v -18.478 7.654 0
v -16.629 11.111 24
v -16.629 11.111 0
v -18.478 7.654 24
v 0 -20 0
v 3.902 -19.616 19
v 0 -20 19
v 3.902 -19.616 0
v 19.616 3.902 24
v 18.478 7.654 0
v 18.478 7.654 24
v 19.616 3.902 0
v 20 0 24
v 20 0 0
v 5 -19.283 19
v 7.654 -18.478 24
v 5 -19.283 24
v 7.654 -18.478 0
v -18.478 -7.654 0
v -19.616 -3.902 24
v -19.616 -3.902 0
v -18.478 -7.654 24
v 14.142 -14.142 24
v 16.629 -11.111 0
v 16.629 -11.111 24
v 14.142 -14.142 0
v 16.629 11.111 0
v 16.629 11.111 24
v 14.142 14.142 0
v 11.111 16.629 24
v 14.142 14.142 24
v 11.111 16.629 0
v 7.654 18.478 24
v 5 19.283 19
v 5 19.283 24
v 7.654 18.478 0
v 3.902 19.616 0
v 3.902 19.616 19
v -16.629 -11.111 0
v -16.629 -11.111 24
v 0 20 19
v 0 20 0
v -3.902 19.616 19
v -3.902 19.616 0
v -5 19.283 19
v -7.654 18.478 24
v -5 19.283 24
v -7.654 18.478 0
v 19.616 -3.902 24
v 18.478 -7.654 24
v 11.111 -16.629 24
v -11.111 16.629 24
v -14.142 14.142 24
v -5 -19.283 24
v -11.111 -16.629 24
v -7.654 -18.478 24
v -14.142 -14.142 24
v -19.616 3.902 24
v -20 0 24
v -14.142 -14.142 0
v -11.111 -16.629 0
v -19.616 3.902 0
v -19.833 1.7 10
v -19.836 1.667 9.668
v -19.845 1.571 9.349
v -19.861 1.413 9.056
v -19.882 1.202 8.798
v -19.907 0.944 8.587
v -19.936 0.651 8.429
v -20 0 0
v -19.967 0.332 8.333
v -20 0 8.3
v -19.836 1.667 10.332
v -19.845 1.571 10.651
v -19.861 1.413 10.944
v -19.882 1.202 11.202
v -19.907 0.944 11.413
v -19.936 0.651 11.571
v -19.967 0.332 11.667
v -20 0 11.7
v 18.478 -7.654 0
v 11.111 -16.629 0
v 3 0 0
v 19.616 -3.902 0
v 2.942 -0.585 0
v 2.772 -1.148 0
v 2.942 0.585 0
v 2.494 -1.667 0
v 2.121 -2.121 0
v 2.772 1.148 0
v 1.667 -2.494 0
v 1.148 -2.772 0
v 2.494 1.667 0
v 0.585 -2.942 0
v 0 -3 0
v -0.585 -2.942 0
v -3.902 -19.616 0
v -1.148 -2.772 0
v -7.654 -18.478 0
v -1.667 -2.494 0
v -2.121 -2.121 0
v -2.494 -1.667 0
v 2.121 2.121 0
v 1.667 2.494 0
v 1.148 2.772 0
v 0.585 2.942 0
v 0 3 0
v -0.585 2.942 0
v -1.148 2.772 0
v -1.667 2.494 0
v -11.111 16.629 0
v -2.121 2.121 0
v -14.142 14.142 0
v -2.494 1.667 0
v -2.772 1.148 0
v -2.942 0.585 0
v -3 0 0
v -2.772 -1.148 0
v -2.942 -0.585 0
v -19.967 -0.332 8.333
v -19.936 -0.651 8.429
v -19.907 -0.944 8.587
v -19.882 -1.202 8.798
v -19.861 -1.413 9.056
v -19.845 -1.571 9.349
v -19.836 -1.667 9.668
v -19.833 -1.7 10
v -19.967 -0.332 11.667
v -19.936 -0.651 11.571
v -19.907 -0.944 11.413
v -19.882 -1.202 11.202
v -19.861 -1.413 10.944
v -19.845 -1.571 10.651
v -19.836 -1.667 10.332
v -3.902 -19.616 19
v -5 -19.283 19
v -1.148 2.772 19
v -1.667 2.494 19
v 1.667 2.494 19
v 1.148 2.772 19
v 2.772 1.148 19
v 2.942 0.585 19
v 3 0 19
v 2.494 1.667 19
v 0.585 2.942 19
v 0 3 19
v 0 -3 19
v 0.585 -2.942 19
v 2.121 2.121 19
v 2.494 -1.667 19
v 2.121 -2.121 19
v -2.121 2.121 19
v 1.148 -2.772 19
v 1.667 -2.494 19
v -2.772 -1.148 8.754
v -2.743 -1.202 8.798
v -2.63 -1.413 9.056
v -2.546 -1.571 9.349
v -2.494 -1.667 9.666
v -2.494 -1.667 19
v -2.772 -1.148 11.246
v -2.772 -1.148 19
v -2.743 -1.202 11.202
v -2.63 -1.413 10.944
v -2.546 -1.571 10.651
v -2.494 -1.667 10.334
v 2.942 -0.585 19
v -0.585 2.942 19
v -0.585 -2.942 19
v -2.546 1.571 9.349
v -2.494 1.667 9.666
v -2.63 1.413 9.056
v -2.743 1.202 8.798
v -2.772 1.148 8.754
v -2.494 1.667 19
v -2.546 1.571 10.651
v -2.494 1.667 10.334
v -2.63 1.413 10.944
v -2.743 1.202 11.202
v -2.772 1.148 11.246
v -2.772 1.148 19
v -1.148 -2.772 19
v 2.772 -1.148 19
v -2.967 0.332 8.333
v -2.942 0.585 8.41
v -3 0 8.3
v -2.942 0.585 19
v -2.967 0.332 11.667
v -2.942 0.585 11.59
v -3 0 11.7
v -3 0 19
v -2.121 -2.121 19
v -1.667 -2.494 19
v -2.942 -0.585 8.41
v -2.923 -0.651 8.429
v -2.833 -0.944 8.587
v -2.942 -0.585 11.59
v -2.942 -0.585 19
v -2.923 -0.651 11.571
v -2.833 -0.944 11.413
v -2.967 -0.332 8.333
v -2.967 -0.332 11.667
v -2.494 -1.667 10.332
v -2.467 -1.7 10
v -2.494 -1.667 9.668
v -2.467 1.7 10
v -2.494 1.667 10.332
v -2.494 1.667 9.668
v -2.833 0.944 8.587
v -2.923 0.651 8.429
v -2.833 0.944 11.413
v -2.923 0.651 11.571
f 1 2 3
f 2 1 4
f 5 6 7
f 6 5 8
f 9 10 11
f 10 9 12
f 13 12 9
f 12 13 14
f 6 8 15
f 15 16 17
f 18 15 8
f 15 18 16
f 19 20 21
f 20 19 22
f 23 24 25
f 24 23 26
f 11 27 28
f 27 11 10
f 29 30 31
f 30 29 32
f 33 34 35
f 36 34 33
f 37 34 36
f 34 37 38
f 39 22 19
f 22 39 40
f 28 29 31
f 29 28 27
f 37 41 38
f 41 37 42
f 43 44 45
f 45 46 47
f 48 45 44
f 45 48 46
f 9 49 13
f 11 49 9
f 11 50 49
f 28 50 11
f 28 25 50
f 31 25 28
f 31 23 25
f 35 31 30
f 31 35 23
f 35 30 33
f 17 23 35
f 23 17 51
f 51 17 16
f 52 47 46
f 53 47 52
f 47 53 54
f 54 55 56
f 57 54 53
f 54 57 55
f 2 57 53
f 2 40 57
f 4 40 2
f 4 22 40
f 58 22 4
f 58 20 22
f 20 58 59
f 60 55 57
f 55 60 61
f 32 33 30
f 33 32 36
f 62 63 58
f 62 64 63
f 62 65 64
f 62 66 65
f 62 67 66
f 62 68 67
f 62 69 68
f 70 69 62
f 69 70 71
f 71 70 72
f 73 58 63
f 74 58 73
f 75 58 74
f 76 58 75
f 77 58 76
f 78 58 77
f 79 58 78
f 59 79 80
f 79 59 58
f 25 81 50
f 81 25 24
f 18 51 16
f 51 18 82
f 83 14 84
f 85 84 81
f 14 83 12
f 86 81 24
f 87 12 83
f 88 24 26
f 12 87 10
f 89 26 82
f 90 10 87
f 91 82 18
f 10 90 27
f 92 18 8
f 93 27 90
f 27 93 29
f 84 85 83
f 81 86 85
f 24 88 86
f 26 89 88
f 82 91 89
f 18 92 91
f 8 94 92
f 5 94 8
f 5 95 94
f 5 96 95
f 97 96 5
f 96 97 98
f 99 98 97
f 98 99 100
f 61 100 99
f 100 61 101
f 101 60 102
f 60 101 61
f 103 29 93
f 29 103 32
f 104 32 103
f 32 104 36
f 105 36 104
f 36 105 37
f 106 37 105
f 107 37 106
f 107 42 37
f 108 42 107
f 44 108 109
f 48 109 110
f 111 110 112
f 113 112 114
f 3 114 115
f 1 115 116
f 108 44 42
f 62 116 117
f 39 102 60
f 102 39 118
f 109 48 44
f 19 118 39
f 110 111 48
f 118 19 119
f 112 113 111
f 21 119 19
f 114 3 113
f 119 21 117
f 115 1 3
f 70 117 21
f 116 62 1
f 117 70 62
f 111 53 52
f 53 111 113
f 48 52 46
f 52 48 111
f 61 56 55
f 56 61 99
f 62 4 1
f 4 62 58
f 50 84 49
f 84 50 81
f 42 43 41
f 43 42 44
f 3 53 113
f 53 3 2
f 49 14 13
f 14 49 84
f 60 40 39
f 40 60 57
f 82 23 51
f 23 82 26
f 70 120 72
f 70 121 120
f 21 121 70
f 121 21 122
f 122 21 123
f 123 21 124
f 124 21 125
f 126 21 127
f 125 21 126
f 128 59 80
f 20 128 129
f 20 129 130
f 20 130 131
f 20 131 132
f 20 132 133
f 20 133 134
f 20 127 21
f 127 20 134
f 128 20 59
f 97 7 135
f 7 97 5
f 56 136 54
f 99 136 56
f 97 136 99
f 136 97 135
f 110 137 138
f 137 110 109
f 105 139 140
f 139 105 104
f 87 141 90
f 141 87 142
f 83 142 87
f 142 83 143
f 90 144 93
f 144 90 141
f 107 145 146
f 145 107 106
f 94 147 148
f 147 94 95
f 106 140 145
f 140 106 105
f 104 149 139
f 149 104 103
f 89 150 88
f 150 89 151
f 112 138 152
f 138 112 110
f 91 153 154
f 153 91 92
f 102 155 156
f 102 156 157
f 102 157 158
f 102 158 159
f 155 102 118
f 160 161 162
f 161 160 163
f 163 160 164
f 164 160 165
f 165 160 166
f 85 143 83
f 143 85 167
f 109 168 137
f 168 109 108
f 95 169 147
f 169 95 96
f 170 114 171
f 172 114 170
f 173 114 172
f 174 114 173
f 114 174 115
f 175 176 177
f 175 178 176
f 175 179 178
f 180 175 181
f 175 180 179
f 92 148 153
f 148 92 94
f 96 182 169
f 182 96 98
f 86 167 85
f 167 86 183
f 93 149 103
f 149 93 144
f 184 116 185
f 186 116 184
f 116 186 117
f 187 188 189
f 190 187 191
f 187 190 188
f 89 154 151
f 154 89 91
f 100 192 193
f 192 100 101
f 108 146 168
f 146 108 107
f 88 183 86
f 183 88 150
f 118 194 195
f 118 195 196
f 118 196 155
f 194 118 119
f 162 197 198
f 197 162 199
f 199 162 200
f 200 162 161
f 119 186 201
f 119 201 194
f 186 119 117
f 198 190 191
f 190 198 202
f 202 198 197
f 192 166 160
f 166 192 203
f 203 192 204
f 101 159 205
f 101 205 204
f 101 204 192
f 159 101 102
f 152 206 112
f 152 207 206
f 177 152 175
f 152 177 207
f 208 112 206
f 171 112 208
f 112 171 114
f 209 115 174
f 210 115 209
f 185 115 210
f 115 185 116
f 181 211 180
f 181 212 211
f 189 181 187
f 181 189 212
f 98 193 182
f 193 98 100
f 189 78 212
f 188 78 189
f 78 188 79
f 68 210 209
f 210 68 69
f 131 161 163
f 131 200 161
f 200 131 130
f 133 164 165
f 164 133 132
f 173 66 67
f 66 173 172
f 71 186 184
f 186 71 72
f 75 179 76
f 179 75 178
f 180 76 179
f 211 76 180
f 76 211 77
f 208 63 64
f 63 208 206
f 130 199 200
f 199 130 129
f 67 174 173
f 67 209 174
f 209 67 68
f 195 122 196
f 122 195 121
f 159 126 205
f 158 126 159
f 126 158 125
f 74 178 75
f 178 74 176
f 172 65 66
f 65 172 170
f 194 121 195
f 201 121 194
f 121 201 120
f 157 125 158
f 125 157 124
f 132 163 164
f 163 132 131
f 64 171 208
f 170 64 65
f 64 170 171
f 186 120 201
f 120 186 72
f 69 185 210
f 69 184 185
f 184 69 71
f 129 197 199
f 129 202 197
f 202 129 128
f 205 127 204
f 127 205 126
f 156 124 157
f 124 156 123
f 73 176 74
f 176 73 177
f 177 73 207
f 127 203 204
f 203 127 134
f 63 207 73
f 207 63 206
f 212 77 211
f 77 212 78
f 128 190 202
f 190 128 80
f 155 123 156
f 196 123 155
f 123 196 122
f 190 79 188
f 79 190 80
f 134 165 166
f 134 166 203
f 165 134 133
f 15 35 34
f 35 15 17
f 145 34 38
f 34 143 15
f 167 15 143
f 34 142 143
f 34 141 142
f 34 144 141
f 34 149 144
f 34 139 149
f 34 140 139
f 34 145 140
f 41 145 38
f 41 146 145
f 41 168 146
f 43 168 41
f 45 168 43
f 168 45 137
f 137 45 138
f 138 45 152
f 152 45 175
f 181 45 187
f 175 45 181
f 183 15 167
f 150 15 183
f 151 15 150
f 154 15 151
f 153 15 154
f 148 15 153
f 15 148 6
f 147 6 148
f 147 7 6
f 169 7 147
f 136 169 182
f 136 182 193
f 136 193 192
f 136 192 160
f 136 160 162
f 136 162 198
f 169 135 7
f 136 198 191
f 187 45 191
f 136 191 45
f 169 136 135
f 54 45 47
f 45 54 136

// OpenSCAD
$fn = 32;

// ----------------------------------------------------------------------
// Oldham coupling hub: 40 x 24 mm
// ----------------------------------------------------------------------

// --- parameters (mm) ---
hub_d = 40;               // hub diameter
hub_l = 20;               // hub length
bore_d = 6;               // shaft bore
tongue_w = 10;            // drive tongue width
tongue_h = 4;             // drive tongue height
set_d = 3.4;              // set screw tap hole

module hub() {
  /* the slot side is a raised disc with a groove milled across it */
  cylinder(h = hub_l + tongue_h, d = hub_d);
}

difference() {
  hub();
  translate([0, 0, -1]) cylinder(h = hub_l + tongue_h + 2, d = bore_d);
  translate([-hub_d / 2 - 1, 0, hub_l * 0.5])
    rotate([0, 90, 0]) cylinder(h = hub_d / 2 + 2, d = set_d);
  translate([-tongue_w / 2, -hub_d / 2 - 1, hub_l - 1])
    cube([tongue_w, hub_d + 2, tongue_h + 1]);
}
